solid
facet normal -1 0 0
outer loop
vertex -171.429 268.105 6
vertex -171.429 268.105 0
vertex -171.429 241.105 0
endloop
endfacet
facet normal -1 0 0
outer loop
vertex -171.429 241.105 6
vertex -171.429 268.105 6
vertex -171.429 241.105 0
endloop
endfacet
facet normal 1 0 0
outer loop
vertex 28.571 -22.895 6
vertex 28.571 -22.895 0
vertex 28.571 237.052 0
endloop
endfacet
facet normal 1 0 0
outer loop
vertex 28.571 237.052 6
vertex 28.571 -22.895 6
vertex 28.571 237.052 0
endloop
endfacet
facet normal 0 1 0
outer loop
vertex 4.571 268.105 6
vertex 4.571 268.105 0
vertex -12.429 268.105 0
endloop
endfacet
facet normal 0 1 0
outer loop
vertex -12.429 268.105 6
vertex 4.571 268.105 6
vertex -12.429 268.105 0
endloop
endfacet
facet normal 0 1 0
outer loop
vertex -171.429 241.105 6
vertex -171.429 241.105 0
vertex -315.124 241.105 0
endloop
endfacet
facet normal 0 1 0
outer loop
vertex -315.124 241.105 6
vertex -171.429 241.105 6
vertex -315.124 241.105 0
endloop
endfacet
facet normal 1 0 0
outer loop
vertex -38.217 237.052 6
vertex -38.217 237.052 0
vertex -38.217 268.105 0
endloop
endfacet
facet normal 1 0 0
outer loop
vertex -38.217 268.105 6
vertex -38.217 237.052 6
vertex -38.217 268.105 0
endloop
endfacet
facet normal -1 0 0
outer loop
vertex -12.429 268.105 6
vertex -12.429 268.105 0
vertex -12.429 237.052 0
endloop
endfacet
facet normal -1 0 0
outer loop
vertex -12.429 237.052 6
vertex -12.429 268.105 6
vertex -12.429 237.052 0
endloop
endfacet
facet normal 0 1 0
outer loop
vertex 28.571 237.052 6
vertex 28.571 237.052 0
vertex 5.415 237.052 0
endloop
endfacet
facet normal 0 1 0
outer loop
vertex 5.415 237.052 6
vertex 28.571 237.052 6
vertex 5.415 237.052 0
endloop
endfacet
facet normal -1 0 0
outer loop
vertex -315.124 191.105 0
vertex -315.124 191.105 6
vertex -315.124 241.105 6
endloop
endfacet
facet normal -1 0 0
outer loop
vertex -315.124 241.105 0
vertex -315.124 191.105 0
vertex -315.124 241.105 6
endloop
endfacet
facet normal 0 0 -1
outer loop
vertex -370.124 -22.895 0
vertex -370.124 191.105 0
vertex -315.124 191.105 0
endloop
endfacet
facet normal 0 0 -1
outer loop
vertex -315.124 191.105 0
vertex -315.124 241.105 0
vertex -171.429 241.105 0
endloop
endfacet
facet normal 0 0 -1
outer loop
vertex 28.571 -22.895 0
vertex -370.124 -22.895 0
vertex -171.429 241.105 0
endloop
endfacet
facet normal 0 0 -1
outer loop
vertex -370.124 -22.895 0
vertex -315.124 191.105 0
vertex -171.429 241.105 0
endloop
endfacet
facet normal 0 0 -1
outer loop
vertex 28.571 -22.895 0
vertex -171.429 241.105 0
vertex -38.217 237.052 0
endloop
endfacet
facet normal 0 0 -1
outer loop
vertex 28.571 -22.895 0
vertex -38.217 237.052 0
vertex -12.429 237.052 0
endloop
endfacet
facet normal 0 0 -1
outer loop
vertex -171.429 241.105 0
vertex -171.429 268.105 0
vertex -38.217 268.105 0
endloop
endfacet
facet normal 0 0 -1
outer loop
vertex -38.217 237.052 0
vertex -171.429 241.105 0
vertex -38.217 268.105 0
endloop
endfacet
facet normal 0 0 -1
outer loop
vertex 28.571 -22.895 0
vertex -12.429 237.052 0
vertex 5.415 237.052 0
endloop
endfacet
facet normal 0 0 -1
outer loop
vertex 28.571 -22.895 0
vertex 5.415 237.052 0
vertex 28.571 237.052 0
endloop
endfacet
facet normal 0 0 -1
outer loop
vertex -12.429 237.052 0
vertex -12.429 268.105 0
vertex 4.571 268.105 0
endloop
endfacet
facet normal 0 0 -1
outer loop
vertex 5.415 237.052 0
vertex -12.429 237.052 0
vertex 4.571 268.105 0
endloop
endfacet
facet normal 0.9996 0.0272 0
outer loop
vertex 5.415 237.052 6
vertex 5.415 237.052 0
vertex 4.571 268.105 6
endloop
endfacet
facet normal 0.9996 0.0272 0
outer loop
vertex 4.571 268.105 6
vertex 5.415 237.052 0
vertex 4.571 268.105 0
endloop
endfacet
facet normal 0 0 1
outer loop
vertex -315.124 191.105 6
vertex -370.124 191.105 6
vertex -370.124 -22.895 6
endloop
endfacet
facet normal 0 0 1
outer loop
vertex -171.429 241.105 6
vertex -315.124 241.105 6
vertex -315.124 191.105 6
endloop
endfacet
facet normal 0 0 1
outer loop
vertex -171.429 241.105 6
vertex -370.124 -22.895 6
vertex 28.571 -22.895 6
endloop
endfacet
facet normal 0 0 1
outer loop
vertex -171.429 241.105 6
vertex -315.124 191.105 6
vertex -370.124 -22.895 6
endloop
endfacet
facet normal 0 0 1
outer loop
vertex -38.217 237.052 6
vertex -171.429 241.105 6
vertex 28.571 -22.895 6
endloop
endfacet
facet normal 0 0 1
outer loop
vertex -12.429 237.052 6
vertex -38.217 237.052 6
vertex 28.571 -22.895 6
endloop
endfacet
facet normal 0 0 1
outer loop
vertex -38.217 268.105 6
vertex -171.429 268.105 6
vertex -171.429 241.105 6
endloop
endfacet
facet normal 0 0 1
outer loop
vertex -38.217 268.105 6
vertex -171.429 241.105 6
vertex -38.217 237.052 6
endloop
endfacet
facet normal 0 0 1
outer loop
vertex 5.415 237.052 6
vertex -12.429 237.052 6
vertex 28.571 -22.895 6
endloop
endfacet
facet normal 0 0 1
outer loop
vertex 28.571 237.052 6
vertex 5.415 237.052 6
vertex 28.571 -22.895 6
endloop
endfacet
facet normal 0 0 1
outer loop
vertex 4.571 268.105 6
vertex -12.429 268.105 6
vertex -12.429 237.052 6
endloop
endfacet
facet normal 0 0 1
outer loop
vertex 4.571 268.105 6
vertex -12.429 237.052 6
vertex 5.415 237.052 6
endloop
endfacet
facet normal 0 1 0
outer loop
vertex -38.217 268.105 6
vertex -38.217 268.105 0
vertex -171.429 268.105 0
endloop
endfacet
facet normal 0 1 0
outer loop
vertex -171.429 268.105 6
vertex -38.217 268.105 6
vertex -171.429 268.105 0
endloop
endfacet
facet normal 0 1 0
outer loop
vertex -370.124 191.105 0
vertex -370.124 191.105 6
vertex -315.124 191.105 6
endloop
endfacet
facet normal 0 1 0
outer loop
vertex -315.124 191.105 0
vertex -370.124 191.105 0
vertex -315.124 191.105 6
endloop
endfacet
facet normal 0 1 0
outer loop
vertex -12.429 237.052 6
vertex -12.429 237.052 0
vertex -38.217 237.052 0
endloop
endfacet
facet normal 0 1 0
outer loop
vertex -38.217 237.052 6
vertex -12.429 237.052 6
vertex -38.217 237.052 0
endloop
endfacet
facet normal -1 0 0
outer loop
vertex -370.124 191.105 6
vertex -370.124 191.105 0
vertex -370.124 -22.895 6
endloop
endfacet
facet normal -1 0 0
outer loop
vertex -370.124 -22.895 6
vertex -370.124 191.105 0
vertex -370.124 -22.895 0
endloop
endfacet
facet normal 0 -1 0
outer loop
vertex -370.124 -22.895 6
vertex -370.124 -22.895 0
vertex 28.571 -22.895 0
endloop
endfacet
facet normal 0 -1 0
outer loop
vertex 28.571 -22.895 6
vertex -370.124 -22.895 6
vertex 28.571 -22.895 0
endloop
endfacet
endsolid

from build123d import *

# Parameters (mm, degrees)
BOSS_EXTRUDE1_DEPTH = 6
SKETCH2_W           = 55
SKETCH2_H           = 50
CUT_EXTRUDE1_DEPTH  = 10


with BuildPart() as part:
    # Sketch1 → Boss-Extrude1 (new body)
    with BuildSketch(Plane.XY):
        Polygon((28.571428571, 236.060202245), (28.571428571, 237.05184048), (5.415486436, 237.05184048), (4.571428571, 268.104761905), (-12.428571429, 268.104761905), (-12.428571429, 237.05184048), (-38.216595912, 237.05184048), (-38.216595912, 268.104761905), (-171.428571429, 268.104761905), (-171.428571429, 241.104761905), (-370.123537574, 241.104761905), (-370.123537574, -22.895238095), (28.571428571, -22.895238095), align=None)
    extrude(amount=BOSS_EXTRUDE1_DEPTH)

    # Sketch2 → Cut-Extrude1 (cut)
    with BuildSketch(Plane.XY.offset(6)):
        with Locations((-342.623537574, 216.104761905)):
            Rectangle(SKETCH2_W, SKETCH2_H)
    extrude(amount=-CUT_EXTRUDE1_DEPTH, mode=Mode.SUBTRACT)


solid = part.part
